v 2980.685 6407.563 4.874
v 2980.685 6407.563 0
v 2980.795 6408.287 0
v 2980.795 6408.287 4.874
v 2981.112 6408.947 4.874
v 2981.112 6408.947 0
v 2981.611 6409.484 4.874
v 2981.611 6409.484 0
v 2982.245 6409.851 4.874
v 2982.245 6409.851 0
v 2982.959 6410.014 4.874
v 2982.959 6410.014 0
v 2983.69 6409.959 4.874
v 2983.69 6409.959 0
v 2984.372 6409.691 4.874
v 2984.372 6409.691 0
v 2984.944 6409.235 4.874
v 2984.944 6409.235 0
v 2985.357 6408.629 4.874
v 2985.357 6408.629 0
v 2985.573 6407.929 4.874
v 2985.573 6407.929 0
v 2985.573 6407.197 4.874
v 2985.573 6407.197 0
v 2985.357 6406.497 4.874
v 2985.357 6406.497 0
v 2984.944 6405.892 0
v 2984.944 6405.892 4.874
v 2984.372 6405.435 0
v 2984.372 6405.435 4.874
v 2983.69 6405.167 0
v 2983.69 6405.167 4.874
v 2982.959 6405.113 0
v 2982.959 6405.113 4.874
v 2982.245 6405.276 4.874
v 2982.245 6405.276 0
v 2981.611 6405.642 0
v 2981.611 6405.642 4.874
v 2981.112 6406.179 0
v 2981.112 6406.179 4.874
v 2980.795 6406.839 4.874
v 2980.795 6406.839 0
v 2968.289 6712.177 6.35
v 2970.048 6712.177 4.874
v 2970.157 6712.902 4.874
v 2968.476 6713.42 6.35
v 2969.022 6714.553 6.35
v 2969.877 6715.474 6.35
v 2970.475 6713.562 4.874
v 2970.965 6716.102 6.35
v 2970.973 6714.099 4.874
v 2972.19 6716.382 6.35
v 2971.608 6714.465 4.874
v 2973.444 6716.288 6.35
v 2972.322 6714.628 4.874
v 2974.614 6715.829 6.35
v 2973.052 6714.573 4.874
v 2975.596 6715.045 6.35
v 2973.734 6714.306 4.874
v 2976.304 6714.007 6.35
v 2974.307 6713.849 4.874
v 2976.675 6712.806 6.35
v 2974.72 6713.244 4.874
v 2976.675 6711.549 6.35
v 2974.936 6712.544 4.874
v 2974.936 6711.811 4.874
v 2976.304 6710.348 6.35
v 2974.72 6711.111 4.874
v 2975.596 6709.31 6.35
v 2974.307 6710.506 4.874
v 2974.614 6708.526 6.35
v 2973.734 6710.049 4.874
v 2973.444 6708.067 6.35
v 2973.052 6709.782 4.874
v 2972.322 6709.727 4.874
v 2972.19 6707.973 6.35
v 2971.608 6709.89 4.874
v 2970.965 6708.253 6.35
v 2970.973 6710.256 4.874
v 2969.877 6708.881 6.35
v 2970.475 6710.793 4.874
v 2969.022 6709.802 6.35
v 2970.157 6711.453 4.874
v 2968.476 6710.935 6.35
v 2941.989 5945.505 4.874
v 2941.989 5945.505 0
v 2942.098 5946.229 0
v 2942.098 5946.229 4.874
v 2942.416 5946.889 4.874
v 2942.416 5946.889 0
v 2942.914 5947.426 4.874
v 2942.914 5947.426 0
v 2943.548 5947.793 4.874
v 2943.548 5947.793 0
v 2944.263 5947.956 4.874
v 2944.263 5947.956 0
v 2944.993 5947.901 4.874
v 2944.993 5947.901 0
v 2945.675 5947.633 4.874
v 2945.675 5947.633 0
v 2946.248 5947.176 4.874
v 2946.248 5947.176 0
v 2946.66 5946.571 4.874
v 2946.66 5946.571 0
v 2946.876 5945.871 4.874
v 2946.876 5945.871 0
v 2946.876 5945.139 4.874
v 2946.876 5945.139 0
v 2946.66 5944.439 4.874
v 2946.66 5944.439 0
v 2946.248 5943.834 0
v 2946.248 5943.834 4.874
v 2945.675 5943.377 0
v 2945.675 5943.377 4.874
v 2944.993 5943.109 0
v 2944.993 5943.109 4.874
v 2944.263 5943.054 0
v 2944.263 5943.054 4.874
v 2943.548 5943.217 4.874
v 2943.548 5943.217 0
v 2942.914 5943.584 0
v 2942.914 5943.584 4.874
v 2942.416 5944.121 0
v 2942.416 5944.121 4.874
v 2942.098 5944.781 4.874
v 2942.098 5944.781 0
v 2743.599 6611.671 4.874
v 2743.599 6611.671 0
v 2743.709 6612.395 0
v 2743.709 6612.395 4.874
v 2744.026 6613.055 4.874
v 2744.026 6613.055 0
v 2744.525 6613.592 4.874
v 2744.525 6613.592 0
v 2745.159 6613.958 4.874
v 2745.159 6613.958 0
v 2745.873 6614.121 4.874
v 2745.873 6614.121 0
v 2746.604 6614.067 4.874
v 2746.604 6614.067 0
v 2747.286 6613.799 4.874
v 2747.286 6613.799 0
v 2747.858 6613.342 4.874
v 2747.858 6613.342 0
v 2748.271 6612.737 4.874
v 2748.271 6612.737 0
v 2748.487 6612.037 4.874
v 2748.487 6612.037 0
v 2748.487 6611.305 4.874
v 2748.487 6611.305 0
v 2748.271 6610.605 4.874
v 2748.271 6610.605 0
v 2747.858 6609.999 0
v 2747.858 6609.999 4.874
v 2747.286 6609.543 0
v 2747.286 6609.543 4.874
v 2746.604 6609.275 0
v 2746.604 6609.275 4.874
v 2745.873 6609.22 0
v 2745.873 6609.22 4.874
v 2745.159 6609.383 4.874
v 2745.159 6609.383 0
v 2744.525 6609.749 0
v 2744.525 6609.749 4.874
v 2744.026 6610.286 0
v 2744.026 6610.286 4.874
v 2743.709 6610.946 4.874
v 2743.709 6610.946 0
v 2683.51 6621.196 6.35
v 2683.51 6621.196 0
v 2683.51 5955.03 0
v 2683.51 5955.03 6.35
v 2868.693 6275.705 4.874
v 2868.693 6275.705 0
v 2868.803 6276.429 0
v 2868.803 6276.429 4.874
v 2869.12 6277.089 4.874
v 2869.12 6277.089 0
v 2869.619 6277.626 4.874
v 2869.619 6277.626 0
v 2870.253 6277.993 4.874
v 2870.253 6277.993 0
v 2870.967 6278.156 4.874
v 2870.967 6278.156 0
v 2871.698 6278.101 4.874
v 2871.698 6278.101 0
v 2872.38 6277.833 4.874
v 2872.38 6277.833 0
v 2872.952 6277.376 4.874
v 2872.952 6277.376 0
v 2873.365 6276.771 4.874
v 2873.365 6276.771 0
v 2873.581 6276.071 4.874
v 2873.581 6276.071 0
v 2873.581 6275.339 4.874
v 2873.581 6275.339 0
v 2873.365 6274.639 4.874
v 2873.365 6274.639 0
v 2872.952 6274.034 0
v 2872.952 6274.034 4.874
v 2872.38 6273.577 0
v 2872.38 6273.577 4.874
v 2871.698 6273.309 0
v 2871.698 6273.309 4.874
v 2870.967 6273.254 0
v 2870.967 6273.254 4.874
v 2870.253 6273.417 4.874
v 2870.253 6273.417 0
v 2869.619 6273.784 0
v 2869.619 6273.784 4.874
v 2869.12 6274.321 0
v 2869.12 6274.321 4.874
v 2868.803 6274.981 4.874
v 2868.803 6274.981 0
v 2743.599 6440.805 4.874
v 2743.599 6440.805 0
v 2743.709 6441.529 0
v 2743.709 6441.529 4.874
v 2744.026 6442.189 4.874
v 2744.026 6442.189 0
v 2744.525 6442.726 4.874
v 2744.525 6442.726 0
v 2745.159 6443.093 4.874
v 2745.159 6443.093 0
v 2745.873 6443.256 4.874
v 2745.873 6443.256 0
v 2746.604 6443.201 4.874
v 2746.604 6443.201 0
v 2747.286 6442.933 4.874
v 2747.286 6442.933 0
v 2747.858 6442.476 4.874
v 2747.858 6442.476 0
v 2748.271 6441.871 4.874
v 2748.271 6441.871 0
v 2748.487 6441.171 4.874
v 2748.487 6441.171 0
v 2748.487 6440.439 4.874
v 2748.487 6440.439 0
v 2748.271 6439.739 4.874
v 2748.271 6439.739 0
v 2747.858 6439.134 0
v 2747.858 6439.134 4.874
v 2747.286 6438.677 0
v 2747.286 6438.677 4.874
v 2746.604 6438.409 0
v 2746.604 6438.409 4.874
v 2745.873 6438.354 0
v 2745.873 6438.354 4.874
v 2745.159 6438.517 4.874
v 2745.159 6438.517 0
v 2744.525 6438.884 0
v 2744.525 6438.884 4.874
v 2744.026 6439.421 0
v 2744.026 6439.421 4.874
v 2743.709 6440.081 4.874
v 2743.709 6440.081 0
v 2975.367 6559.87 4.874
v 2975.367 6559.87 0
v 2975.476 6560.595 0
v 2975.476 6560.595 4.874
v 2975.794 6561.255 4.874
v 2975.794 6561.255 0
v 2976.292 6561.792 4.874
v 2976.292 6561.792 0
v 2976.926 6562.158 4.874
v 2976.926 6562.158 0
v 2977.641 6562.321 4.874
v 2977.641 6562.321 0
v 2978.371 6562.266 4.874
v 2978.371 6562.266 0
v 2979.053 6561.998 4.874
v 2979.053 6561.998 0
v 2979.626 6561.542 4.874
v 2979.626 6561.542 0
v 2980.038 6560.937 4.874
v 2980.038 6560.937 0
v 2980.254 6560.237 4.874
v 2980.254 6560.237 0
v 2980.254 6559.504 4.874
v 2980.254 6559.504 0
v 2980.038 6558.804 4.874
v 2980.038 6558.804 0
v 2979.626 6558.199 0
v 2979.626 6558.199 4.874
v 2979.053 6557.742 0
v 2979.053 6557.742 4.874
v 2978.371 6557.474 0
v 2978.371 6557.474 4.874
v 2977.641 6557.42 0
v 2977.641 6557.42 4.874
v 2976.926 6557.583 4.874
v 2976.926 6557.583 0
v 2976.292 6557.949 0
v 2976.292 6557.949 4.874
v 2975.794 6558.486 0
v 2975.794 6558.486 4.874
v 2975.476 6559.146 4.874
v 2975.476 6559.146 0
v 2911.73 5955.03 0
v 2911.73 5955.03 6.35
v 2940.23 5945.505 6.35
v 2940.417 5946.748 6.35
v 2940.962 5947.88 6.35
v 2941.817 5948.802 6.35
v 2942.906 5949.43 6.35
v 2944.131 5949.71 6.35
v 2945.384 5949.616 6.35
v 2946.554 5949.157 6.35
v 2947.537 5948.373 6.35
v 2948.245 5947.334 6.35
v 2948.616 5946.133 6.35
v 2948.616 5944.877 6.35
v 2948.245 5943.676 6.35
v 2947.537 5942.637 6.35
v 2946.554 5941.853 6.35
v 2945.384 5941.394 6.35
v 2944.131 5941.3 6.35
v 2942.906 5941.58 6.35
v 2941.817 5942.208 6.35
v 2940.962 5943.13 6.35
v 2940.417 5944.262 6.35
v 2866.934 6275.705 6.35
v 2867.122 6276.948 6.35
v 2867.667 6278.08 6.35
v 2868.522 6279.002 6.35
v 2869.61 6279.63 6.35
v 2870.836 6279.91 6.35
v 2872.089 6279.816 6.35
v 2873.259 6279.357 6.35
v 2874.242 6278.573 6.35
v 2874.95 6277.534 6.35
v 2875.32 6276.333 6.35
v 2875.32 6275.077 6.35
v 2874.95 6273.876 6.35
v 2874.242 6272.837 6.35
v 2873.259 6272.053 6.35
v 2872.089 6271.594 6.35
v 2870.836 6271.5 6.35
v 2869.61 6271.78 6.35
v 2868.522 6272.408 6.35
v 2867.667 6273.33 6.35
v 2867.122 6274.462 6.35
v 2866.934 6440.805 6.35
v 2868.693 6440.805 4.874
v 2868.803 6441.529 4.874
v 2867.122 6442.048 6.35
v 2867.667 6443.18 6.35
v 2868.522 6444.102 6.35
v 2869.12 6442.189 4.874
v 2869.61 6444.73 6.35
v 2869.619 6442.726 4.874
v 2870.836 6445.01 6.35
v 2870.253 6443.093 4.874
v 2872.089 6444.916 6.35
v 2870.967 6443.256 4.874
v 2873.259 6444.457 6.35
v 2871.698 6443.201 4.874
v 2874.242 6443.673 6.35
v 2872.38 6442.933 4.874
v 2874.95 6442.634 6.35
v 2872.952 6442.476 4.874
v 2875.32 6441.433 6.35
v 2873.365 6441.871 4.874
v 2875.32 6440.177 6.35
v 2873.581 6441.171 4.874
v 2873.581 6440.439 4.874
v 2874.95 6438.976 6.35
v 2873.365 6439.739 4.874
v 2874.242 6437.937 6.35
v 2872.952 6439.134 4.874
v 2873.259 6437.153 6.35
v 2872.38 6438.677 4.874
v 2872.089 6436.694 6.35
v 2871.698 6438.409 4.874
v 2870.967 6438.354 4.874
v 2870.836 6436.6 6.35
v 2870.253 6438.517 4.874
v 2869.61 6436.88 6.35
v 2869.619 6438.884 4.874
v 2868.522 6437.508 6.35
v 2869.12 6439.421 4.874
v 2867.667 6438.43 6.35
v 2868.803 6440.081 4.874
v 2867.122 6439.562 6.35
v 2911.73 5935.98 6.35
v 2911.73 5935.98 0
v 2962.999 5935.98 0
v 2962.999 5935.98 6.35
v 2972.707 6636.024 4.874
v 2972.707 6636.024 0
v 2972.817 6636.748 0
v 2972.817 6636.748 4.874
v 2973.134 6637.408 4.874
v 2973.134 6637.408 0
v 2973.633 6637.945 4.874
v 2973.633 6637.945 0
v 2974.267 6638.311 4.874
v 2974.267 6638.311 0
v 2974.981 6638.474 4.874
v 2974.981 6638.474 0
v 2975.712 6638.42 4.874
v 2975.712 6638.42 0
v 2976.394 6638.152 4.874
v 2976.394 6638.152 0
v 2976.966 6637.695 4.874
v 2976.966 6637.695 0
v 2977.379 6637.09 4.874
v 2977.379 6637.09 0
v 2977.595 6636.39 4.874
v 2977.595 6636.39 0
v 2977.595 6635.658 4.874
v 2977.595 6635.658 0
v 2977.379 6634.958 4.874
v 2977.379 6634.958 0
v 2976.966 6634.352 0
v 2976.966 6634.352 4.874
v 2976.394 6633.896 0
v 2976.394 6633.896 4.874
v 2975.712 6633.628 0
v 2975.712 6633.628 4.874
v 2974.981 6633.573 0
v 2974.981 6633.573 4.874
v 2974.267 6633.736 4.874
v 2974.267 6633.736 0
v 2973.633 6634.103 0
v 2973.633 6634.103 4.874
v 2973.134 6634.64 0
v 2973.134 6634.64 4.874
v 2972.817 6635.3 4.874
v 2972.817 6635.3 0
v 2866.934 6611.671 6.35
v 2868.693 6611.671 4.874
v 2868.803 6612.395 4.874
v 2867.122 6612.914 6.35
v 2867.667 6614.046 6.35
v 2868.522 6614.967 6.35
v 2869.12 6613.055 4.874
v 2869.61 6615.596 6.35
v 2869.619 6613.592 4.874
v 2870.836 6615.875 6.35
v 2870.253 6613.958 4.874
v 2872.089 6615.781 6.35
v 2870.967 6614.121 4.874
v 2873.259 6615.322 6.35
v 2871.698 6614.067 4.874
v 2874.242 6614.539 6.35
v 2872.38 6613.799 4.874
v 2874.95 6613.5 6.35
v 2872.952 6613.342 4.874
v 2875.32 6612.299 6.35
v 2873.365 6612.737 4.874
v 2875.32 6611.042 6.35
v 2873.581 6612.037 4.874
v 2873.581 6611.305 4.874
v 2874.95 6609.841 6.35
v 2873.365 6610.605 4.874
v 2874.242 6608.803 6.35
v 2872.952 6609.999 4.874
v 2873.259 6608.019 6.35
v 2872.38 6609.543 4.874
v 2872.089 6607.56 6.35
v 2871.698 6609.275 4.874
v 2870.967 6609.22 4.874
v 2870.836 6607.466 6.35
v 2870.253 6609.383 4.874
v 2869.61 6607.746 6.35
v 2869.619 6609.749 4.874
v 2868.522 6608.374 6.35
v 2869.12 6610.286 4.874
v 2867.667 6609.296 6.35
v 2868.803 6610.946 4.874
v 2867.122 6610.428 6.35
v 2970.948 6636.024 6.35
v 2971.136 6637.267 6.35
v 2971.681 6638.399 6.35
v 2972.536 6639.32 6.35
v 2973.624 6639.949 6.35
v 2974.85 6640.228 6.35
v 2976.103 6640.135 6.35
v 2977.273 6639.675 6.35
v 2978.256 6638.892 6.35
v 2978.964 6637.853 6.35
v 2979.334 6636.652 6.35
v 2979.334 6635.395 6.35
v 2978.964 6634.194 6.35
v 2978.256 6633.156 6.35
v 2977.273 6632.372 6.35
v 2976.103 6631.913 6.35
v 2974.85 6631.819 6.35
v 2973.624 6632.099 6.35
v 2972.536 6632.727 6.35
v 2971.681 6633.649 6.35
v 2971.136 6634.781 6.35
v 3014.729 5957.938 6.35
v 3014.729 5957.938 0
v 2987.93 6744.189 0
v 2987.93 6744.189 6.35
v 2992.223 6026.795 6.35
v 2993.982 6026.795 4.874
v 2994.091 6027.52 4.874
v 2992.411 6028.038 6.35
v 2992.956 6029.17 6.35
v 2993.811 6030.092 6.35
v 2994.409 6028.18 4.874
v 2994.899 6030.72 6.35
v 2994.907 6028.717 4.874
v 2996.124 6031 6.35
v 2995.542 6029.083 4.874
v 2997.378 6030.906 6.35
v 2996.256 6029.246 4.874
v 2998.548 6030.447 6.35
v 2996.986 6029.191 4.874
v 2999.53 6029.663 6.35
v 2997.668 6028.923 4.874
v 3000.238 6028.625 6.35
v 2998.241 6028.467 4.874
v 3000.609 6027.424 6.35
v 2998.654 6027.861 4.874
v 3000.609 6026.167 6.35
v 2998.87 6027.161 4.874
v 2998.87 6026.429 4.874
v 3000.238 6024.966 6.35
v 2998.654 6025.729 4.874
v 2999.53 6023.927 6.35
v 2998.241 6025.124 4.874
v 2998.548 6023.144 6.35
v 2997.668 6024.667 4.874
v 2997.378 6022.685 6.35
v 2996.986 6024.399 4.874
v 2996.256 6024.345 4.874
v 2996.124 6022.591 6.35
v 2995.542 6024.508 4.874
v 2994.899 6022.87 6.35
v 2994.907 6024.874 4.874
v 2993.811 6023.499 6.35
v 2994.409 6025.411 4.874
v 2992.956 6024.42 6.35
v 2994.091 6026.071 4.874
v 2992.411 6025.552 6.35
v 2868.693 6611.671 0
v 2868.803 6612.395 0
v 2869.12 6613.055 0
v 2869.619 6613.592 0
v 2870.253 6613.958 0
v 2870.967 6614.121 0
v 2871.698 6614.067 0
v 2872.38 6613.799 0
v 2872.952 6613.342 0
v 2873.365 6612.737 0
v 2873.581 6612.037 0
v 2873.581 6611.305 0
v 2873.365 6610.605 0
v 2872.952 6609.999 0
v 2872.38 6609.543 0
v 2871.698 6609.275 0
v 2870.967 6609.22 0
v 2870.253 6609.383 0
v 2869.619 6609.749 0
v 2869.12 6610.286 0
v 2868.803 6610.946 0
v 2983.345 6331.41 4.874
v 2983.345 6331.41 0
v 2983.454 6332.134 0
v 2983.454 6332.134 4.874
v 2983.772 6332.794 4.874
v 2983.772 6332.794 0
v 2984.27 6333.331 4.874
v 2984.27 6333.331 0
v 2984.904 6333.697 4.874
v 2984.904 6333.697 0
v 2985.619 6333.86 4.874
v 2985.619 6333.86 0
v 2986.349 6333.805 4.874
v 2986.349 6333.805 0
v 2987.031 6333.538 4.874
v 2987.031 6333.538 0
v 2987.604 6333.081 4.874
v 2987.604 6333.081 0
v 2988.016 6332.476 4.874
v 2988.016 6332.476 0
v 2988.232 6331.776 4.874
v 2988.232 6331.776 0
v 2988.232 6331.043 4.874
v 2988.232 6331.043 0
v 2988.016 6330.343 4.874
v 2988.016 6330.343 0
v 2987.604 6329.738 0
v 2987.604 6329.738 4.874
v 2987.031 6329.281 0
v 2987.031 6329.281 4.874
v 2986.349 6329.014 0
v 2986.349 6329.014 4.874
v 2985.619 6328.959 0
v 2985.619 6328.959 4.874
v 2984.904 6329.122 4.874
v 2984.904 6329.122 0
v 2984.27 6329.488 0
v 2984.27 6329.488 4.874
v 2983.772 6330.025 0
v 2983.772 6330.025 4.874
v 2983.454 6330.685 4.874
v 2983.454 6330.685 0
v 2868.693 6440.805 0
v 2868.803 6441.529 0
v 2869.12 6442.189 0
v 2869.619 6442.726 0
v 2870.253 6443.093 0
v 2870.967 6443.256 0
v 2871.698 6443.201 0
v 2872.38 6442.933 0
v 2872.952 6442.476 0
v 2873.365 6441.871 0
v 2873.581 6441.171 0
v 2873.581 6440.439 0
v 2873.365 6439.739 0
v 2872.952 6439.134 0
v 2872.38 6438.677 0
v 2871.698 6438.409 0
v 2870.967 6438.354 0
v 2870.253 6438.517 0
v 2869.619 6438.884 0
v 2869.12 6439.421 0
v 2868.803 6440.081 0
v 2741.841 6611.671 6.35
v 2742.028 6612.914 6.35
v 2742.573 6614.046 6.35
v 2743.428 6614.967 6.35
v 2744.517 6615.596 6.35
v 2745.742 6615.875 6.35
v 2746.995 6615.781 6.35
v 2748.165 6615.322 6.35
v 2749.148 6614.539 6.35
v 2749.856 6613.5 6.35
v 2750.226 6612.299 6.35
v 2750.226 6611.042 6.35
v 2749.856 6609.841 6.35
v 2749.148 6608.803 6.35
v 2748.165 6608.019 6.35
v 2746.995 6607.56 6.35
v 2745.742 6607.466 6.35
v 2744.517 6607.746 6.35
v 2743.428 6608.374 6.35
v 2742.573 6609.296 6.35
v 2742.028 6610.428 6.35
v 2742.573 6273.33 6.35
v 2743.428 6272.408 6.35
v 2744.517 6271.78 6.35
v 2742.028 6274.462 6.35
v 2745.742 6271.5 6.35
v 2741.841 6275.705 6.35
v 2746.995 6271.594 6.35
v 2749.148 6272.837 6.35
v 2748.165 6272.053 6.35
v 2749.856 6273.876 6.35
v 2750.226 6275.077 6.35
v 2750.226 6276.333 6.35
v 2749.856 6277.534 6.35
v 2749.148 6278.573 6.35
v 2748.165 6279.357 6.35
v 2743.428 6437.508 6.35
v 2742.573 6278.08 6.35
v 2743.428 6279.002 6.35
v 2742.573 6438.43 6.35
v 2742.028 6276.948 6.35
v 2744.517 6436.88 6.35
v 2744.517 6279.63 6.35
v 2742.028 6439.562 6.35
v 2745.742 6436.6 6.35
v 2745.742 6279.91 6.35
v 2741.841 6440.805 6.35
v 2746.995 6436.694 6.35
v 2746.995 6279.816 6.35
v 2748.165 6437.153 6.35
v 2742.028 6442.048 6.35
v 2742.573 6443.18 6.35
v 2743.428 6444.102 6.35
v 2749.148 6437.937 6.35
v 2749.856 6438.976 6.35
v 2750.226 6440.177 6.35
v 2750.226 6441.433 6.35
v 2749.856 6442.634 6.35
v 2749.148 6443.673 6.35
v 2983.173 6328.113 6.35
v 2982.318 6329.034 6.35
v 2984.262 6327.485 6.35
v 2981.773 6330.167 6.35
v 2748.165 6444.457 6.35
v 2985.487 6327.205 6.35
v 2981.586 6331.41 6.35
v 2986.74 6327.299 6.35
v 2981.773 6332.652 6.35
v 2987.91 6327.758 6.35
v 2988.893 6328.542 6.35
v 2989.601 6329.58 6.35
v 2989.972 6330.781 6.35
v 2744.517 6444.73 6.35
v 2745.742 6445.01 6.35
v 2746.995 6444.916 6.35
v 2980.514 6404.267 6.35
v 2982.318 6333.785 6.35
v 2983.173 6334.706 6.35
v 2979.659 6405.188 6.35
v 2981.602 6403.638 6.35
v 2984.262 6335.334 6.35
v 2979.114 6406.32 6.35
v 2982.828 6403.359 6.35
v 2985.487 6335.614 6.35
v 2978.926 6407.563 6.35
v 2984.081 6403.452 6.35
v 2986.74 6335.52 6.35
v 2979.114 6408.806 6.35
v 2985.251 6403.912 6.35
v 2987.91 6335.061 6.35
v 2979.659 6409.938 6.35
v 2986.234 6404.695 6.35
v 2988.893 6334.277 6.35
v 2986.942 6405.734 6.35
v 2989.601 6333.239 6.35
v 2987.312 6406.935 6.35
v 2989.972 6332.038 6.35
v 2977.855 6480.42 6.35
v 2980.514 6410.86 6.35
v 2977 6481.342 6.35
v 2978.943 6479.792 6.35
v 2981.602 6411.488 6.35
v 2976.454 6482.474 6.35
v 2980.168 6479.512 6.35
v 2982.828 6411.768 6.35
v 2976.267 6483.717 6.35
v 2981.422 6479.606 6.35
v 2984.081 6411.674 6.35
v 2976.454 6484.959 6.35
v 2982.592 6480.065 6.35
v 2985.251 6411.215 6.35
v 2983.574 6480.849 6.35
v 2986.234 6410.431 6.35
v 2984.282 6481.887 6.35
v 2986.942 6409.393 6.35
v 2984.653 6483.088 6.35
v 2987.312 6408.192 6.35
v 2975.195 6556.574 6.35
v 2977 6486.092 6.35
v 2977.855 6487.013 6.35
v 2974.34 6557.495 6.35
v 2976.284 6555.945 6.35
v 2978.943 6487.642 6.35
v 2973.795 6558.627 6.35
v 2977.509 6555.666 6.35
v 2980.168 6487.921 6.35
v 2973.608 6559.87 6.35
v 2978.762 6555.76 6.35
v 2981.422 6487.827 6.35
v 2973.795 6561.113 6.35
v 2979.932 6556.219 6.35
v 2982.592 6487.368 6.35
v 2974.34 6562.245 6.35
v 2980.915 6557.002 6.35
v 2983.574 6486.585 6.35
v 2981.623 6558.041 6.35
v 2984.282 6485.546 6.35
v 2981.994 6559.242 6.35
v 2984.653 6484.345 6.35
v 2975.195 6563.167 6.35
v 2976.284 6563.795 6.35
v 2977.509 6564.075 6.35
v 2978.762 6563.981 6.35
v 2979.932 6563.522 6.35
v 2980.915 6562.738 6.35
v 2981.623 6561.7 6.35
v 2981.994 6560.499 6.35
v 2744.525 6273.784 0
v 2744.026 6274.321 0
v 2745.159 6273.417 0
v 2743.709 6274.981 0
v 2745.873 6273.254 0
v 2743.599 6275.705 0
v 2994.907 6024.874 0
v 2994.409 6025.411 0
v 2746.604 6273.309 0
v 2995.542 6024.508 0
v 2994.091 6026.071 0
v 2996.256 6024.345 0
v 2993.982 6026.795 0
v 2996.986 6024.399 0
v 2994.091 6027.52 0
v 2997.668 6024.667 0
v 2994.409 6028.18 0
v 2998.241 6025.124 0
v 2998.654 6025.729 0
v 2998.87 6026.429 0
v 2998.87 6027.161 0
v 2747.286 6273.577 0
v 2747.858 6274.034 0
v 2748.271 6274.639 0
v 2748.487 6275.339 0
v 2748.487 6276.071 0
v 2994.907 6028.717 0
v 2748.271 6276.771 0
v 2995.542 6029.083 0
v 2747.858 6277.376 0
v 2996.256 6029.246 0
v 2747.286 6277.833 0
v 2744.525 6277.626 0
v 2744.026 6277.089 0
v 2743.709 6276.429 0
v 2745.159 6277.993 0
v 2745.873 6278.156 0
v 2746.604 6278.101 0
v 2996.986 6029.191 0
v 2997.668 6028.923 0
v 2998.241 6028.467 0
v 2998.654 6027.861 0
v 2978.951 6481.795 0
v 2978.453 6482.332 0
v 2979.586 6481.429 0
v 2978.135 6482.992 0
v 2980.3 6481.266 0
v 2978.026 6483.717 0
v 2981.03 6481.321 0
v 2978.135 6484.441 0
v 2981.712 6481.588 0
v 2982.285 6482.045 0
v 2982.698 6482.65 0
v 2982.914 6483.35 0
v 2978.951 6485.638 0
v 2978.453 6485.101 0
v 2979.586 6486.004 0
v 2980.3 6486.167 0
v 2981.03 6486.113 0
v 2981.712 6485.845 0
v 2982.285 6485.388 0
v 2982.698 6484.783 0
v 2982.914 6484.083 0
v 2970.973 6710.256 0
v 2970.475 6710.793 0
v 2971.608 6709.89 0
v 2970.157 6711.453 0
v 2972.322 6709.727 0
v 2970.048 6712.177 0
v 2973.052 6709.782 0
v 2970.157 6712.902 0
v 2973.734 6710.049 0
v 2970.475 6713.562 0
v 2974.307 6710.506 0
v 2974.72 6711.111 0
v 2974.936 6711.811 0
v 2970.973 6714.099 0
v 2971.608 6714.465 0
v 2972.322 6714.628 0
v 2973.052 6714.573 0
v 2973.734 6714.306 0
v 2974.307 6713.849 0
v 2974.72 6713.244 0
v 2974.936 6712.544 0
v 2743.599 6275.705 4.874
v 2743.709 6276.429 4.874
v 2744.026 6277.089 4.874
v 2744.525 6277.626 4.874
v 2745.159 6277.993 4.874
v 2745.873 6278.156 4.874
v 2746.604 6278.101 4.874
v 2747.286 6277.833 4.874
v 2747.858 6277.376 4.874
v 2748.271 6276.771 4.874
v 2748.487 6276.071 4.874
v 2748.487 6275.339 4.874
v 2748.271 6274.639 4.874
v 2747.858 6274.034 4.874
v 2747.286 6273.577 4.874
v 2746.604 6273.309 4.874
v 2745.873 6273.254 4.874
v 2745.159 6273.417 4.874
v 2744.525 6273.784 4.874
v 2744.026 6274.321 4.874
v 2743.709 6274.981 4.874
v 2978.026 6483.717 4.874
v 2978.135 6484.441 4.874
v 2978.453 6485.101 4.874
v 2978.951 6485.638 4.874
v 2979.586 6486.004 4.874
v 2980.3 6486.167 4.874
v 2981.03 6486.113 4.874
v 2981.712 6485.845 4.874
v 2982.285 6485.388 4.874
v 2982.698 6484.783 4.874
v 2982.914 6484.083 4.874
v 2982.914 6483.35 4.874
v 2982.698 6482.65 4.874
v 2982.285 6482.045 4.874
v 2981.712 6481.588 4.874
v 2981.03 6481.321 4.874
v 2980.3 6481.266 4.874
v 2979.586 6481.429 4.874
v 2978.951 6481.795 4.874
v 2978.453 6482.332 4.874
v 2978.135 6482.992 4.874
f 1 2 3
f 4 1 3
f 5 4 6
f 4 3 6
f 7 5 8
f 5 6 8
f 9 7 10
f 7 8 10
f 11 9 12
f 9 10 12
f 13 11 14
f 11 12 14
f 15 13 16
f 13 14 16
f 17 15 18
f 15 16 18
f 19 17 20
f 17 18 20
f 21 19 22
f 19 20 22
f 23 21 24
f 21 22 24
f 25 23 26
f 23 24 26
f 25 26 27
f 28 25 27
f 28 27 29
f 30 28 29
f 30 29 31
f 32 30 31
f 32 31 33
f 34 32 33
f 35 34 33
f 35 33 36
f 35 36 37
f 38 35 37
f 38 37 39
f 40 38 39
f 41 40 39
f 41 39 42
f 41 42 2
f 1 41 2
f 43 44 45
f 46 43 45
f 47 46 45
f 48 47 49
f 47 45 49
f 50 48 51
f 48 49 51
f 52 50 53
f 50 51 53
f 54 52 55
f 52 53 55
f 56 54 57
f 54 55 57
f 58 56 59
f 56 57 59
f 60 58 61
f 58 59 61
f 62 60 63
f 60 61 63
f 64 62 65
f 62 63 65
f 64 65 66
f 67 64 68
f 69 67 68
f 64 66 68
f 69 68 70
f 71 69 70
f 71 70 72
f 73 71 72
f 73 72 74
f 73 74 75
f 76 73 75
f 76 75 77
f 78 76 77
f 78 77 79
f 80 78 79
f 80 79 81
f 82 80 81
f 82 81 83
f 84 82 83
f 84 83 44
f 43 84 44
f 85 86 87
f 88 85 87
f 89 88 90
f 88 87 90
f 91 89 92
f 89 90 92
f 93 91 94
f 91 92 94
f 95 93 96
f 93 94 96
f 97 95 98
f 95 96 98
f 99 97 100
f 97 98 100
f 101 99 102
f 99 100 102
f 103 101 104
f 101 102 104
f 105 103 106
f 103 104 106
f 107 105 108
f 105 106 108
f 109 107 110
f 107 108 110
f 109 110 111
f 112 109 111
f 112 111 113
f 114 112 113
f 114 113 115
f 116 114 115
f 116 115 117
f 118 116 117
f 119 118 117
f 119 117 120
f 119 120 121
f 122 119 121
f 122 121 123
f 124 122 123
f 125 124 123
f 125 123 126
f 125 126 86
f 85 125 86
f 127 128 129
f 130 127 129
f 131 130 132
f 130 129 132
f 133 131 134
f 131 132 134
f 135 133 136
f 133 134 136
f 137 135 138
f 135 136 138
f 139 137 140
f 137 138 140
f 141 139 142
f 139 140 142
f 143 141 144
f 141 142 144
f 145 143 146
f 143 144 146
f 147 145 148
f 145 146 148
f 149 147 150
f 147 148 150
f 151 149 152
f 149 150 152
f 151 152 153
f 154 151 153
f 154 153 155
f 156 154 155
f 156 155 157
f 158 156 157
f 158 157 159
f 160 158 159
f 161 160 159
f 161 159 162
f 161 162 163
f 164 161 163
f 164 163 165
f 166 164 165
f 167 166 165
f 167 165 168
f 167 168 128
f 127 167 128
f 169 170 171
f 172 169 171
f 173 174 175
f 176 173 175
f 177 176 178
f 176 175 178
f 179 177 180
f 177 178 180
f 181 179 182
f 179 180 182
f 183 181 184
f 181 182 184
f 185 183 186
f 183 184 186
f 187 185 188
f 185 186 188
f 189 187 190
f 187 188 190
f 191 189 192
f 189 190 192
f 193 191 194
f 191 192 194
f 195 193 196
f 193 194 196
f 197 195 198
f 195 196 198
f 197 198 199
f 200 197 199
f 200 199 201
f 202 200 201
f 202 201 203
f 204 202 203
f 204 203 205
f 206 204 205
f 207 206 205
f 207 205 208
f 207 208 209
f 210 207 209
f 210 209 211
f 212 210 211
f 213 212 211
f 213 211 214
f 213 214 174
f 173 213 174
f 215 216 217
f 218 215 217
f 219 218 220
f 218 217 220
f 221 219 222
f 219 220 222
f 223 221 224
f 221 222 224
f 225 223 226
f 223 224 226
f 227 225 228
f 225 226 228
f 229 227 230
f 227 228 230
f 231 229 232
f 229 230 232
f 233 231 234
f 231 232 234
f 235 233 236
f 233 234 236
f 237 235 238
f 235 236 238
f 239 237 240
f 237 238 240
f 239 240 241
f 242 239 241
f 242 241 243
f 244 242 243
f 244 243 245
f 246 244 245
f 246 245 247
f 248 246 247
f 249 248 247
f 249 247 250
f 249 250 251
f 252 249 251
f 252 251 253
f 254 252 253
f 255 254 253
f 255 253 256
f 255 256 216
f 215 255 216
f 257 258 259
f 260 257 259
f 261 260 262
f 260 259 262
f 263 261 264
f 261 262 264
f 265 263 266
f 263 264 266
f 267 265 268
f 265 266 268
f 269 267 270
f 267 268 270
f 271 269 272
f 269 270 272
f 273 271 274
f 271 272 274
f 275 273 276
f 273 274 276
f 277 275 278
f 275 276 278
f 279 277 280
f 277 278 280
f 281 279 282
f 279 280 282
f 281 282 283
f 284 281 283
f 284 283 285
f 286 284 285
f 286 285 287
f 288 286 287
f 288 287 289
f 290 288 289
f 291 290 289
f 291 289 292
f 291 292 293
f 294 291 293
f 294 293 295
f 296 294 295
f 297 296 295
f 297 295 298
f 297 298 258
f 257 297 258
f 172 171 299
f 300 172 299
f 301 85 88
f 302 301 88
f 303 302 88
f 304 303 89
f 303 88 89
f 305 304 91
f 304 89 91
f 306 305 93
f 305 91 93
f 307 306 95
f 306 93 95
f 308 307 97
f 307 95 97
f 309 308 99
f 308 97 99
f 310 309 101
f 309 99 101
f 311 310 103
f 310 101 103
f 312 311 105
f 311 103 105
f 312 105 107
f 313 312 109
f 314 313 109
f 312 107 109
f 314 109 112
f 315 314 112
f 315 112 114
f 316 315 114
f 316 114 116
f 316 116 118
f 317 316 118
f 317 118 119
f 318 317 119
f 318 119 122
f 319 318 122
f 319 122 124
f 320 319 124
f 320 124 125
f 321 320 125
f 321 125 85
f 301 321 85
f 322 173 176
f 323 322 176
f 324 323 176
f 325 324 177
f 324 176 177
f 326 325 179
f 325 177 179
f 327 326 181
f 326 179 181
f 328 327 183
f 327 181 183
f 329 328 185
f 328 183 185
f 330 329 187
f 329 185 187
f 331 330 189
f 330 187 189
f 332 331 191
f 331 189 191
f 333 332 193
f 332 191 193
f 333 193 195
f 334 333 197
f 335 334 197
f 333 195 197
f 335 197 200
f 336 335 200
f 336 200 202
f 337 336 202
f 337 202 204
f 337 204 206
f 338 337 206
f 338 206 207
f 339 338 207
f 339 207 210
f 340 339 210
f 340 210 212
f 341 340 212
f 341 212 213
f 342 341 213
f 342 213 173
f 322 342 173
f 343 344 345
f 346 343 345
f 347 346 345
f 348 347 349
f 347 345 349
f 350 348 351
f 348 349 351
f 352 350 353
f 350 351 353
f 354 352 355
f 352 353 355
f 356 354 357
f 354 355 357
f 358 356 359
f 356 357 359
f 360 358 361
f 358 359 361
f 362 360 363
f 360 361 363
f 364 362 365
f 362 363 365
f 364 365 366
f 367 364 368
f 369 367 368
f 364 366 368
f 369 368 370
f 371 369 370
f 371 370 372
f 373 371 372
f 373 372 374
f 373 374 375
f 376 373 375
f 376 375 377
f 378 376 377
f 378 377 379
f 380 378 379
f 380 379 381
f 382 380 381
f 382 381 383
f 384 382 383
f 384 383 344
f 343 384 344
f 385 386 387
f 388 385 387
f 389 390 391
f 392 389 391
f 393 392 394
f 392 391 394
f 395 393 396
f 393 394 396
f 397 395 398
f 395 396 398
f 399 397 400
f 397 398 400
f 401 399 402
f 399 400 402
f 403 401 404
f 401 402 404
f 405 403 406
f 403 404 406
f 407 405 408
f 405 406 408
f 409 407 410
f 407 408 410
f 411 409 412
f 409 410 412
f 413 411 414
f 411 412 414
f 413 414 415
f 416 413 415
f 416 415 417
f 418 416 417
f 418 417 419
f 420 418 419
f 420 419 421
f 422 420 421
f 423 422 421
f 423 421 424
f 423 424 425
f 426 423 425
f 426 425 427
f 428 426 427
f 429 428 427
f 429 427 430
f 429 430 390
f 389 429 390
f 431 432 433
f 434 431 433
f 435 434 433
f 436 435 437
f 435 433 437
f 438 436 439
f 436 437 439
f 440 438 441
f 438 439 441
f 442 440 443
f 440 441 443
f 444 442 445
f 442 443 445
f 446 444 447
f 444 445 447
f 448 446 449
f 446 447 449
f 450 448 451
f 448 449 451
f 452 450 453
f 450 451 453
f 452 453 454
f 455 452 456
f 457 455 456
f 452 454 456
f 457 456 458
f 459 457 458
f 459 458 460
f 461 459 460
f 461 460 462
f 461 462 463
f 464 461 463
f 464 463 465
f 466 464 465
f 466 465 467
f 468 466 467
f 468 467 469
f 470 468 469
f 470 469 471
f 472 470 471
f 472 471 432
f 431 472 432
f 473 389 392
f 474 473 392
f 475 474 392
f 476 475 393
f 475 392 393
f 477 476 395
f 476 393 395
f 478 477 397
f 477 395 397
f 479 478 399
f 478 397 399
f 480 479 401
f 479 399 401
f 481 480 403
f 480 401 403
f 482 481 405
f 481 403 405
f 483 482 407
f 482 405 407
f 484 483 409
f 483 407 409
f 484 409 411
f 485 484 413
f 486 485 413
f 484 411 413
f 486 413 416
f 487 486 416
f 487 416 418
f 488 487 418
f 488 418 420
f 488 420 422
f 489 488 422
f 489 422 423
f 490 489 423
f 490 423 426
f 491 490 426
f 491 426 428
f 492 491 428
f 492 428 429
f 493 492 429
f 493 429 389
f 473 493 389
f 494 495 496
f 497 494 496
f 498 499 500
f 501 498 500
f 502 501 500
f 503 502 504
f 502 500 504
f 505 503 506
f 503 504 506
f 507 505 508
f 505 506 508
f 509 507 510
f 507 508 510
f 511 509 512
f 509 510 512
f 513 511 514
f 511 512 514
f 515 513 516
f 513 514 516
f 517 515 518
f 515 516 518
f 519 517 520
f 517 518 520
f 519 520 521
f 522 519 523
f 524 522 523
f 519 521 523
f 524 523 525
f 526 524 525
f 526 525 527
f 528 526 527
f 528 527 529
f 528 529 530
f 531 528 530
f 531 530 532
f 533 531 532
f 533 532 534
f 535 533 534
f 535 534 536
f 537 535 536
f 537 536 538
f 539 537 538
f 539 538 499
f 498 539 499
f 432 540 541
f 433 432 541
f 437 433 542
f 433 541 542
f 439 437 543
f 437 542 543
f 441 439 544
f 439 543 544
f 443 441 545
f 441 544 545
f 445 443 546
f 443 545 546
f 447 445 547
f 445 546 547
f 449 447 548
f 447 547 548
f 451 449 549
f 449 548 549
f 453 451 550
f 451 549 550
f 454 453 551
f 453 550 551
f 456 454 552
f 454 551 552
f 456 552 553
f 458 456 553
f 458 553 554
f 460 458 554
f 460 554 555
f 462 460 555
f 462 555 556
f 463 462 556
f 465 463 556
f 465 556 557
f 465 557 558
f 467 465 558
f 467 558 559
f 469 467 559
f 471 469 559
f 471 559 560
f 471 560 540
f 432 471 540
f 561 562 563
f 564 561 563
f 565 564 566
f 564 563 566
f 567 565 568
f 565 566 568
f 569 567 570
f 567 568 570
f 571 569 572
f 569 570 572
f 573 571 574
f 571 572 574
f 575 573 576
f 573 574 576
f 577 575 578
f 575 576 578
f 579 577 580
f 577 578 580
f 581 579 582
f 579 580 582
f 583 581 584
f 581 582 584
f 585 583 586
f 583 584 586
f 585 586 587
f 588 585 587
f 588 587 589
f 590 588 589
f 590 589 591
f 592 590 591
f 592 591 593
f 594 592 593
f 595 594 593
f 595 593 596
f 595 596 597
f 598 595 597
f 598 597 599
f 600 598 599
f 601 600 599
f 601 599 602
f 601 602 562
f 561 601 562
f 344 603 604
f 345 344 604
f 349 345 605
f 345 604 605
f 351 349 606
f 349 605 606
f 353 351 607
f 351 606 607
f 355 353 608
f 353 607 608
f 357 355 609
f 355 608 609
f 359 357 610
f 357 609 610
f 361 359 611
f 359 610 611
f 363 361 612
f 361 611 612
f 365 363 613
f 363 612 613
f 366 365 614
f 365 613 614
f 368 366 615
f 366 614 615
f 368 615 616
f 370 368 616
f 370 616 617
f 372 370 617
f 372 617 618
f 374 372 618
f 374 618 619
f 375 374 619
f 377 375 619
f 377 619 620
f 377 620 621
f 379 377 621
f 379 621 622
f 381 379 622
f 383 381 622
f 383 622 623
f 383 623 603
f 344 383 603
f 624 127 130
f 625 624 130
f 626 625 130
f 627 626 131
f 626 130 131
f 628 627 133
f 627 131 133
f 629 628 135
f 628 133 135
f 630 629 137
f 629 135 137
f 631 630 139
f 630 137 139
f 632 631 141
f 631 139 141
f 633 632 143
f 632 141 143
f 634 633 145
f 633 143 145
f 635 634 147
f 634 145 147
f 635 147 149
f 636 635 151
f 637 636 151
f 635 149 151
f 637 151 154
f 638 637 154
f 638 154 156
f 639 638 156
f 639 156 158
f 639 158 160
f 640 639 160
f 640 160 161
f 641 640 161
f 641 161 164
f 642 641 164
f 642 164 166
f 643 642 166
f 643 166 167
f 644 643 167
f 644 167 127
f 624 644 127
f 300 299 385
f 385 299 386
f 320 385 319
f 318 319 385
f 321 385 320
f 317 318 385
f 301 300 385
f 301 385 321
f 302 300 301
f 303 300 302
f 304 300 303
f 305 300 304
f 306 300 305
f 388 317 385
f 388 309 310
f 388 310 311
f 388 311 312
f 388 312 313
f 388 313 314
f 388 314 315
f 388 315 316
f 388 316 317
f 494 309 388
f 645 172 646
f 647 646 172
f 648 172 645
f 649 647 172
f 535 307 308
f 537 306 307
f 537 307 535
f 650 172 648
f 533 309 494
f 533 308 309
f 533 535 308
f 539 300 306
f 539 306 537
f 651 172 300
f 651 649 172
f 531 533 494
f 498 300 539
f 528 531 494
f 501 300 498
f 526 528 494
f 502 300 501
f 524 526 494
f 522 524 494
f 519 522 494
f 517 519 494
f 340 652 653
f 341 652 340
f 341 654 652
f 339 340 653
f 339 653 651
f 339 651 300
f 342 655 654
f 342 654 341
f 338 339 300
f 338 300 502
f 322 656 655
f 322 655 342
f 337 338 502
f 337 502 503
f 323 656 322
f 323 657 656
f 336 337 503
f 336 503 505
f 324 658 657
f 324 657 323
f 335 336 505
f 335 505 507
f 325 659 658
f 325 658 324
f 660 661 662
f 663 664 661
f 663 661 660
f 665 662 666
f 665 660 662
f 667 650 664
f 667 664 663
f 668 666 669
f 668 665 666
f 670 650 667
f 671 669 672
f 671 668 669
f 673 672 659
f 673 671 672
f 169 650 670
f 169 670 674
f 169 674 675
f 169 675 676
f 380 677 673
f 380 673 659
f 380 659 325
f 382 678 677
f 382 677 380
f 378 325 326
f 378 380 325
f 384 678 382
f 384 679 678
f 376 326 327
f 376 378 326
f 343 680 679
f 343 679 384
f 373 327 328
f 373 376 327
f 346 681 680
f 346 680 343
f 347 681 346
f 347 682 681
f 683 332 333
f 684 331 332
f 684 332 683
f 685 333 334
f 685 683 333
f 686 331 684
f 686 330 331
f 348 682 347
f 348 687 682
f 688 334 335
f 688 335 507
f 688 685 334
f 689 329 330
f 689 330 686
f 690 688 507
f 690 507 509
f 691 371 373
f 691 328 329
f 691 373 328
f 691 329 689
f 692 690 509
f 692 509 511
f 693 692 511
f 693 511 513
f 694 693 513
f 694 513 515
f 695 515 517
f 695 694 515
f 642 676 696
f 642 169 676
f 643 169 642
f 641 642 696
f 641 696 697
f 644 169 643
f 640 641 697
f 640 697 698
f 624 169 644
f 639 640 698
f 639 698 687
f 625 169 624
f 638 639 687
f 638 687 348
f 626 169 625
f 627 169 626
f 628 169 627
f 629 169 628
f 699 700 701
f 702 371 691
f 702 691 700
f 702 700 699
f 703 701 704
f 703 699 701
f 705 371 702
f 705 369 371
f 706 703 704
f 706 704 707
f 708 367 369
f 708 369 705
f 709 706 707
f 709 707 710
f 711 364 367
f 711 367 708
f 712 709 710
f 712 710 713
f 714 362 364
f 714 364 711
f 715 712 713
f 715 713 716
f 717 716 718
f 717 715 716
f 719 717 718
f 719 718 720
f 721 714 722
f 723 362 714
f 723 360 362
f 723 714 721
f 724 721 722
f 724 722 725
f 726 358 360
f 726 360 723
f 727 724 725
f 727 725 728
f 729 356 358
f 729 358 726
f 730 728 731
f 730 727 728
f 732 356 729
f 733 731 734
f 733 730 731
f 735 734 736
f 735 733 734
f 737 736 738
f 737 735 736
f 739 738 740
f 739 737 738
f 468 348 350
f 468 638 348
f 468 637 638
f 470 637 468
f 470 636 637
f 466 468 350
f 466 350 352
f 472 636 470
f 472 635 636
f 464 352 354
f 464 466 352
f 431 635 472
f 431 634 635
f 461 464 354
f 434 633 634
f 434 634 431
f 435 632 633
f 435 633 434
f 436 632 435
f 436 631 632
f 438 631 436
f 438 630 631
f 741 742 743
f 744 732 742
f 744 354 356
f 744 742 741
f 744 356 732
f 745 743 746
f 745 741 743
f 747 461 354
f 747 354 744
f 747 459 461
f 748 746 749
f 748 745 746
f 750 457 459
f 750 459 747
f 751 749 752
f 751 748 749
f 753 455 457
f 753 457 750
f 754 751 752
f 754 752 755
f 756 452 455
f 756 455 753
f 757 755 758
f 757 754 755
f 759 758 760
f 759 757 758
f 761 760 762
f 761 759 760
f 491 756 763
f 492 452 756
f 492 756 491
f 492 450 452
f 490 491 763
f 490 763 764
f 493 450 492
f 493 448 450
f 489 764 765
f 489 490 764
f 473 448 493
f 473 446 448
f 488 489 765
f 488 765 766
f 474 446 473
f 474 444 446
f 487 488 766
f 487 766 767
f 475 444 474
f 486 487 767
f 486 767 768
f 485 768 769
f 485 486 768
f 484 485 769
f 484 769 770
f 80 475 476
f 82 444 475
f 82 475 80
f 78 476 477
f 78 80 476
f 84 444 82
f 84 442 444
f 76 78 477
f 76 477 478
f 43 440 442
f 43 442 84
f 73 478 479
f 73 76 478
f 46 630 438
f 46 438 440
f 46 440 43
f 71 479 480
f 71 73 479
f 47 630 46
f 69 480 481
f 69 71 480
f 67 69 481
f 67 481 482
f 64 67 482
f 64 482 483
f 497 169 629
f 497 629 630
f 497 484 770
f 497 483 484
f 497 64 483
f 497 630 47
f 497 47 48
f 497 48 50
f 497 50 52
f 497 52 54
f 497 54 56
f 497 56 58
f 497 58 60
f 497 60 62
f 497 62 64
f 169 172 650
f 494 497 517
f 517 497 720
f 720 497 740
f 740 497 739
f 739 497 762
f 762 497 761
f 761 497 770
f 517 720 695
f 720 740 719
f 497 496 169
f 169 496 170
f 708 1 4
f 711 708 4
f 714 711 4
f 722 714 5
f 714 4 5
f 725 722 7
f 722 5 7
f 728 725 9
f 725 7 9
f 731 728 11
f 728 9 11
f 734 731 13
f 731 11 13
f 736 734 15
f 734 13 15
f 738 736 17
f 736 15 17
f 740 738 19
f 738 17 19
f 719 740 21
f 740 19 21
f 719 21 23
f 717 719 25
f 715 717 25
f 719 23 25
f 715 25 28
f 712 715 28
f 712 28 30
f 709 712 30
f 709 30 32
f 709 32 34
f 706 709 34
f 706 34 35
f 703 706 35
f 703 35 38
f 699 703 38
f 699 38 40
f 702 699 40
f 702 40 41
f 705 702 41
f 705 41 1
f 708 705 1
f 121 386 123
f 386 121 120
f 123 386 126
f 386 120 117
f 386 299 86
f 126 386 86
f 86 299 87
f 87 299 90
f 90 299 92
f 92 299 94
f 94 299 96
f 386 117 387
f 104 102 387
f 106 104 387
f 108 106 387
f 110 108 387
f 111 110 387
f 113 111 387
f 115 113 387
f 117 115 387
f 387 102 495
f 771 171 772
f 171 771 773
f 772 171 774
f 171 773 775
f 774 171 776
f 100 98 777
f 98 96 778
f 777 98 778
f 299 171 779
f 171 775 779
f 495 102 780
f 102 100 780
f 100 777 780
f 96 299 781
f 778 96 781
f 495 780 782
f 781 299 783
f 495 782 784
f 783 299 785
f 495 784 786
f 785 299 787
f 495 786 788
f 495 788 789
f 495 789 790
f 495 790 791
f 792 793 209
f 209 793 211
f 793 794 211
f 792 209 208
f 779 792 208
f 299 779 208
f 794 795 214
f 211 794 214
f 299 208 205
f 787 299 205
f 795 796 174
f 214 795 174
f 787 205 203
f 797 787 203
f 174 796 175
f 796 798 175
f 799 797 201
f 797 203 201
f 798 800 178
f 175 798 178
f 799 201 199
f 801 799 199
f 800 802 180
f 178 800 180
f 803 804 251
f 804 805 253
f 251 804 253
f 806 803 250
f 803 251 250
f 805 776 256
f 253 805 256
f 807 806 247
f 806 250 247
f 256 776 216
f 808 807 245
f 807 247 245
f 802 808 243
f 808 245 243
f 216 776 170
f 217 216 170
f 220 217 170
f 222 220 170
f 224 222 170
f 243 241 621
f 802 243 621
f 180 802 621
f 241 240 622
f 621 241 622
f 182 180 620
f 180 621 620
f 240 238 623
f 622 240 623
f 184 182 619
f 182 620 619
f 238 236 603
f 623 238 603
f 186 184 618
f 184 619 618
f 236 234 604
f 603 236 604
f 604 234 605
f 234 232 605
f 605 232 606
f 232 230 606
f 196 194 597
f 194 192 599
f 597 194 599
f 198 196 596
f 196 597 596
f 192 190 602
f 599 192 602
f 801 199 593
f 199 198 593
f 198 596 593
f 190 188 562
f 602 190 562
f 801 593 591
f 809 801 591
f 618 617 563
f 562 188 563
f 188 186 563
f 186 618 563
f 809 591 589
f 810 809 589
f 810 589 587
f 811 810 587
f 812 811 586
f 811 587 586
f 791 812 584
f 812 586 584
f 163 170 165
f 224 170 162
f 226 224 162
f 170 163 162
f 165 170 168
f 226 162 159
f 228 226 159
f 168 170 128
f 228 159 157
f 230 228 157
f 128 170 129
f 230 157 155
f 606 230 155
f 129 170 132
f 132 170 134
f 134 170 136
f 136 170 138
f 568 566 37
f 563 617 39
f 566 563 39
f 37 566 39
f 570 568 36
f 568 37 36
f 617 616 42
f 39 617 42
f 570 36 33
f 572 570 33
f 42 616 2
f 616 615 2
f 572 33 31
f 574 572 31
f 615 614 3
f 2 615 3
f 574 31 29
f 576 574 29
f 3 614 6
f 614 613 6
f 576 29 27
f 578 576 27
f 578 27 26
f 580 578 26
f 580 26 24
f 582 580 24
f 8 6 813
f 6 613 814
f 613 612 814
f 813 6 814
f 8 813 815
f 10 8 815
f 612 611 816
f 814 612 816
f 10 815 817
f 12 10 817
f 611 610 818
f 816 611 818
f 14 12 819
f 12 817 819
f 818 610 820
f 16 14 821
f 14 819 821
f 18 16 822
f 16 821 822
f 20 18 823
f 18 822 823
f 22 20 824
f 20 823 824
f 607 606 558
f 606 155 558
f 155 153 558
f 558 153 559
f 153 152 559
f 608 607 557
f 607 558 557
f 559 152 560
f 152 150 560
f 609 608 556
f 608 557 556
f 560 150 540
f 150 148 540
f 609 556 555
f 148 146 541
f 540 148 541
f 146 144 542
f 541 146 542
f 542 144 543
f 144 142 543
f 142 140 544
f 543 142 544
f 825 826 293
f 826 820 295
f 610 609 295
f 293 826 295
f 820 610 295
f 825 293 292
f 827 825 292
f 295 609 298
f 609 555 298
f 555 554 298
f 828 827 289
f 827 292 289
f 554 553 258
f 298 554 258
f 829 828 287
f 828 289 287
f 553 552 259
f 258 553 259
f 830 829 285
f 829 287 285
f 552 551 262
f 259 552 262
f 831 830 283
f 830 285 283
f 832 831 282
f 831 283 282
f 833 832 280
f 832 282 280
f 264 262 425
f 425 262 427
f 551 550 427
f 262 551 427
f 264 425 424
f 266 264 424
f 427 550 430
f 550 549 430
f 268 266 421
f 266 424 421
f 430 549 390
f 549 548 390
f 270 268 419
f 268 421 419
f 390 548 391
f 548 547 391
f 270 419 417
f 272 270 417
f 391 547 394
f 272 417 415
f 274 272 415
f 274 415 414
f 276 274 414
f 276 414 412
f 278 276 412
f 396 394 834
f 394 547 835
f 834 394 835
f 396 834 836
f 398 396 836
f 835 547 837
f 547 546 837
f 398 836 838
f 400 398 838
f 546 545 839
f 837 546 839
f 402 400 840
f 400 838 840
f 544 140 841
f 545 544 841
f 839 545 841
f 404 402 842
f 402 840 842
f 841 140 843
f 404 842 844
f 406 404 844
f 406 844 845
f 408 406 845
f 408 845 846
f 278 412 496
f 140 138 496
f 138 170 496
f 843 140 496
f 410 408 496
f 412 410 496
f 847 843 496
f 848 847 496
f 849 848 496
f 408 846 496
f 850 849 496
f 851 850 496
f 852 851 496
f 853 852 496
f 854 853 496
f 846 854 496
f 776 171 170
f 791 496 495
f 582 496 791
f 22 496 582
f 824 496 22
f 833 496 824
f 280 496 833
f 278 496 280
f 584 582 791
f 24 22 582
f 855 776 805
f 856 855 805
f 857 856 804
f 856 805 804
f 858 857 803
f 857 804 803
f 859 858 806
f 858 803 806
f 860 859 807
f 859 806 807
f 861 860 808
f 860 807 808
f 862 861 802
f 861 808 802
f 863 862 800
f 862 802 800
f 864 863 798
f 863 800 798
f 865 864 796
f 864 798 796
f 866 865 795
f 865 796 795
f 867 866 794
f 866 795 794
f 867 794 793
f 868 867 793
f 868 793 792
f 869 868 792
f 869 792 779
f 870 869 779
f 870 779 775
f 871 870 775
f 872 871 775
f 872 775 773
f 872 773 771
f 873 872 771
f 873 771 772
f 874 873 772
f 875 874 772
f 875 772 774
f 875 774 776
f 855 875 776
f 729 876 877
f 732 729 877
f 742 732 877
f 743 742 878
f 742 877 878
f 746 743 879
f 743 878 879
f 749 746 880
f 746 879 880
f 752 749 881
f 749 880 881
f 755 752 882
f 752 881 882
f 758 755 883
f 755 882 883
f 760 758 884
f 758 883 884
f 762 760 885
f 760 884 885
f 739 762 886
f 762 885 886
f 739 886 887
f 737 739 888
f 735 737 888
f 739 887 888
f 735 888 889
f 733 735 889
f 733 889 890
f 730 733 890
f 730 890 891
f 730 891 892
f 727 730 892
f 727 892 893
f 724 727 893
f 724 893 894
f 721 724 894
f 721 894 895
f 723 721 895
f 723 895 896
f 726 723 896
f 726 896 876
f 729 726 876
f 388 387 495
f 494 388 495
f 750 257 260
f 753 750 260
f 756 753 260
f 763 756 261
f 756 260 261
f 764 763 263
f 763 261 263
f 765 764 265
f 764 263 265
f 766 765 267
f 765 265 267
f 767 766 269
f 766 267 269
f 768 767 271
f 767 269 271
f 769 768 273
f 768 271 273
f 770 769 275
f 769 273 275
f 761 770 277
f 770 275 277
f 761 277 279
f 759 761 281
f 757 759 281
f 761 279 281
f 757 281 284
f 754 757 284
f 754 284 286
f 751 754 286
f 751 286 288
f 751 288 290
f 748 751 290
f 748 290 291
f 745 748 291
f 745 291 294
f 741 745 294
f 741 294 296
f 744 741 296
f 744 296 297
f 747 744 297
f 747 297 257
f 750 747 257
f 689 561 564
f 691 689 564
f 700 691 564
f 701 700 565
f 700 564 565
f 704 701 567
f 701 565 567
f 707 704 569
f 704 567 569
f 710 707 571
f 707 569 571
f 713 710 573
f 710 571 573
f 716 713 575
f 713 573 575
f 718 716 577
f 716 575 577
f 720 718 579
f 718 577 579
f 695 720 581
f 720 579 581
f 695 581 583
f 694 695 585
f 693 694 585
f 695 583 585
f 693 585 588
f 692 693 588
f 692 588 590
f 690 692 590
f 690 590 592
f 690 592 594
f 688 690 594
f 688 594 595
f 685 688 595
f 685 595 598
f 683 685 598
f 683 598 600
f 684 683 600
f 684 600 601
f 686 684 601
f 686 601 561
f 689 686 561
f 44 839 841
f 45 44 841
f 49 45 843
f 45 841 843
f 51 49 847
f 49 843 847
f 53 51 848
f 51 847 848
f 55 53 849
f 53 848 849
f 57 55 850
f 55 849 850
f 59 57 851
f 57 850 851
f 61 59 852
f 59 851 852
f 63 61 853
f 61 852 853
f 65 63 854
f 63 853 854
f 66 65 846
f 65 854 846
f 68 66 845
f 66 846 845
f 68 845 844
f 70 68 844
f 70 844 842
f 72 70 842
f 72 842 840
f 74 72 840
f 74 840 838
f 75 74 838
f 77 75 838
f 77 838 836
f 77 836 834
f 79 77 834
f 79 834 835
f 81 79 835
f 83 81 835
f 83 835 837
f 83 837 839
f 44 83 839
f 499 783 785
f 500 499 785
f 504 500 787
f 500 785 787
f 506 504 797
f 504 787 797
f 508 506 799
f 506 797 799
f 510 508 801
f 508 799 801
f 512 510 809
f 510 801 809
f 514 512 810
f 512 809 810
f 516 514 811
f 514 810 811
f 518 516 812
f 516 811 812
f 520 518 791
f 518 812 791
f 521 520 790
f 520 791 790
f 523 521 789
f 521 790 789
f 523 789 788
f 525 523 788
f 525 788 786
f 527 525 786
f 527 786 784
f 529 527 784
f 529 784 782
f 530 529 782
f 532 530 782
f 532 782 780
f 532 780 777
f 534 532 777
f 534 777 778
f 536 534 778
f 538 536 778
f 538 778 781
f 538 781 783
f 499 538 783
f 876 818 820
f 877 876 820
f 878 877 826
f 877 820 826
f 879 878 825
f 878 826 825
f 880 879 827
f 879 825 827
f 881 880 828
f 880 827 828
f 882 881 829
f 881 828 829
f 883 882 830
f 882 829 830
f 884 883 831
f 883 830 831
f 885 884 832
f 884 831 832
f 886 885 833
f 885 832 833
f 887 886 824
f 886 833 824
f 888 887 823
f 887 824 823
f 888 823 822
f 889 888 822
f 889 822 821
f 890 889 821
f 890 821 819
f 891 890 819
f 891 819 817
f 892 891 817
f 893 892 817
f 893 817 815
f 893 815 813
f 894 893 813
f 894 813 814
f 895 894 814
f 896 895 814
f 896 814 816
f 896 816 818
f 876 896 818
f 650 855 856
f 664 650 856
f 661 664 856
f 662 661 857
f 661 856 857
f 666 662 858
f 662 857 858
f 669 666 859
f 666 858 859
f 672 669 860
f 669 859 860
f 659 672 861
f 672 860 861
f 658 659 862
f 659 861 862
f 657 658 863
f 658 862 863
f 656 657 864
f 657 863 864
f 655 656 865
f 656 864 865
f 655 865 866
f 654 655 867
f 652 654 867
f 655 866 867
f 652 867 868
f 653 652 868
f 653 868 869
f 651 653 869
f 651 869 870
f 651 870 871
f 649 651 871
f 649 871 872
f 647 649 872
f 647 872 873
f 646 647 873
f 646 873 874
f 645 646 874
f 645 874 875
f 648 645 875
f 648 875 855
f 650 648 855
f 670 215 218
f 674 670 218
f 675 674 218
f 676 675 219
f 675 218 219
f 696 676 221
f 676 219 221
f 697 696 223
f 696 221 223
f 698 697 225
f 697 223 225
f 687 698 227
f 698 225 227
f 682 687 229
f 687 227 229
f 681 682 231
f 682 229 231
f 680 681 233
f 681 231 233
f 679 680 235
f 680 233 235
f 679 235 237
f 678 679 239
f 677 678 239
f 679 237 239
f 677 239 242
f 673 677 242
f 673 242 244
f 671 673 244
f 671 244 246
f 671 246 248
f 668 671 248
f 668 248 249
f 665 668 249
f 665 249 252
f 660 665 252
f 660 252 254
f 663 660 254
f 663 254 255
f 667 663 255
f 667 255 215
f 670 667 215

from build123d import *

# Parameters (mm, degrees)
BOSS_EXTRUDE1_DEPTH                               = 6.35
BOSS_EXTRUDE2_DEPTH                               = 6.35
CSK_FOR_8_FLAT_HEAD_MACHINE_SCREW_100_D           = 4.9149
CSK_FOR_8_FLAT_HEAD_MACHINE_SCREW_100_DEPTH       = 6.35
CSK_FOR_8_FLAT_HEAD_MACHINE_SCREW_100_CSINK_D     = 8.4328
CSK_FOR_8_FLAT_HEAD_MACHINE_SCREW_100_CSINK_ANGLE = 100


with BuildPart() as part:
    # Sketch1 → Boss-Extrude1 (new body)
    with BuildSketch(Plane.XY):
        Polygon((2683.510000011, 6621.1958), (2683.510000013, 5955.03), (2911.730002065, 5955.03), (2911.730002065, 5935.980000183), (2962.998658572, 5935.980000183), (3014.728804207, 5957.938144244), (2987.930002065, 6744.189464503), align=None)
    extrude(amount=BOSS_EXTRUDE1_DEPTH)

    # Sketch2 → Boss-Extrude2 (add)
    with BuildSketch(Plane.XY.offset(6.35)):
        Polygon((2933.697739453, 6621.1958), (2683.510000011, 6621.1958), (2683.510000386, 6602.1458), (2933.697739453, 6602.1458), align=None)
    extrude(amount=-BOSS_EXTRUDE2_DEPTH)

    # CSK for #8 Flat Head Machine Screw (100)2
    with Locations(Plane.XY.offset(6.35)):
        with Locations((2871.150804655, 6611.6708), (2746.056935059, 6611.6708), (2746.056934863, 6440.805), (2871.15080459, 6440.805), (2746.0569351, 6275.705000214), (2871.150804763, 6275.705000214), (2944.446214291, 5945.505000556), (2996.439588076, 6026.795207351), (2985.802221481, 6331.409531427), (2983.142879832, 6407.563112446), (2980.483538184, 6483.716693465), (2977.824196535, 6559.870274483), (2975.164854886, 6636.023855502), (2972.505513237, 6712.177436521)):
            CounterSinkHole(CSK_FOR_8_FLAT_HEAD_MACHINE_SCREW_100_D / 2, CSK_FOR_8_FLAT_HEAD_MACHINE_SCREW_100_CSINK_D / 2, depth=CSK_FOR_8_FLAT_HEAD_MACHINE_SCREW_100_DEPTH, counter_sink_angle=CSK_FOR_8_FLAT_HEAD_MACHINE_SCREW_100_CSINK_ANGLE)


solid = part.part
